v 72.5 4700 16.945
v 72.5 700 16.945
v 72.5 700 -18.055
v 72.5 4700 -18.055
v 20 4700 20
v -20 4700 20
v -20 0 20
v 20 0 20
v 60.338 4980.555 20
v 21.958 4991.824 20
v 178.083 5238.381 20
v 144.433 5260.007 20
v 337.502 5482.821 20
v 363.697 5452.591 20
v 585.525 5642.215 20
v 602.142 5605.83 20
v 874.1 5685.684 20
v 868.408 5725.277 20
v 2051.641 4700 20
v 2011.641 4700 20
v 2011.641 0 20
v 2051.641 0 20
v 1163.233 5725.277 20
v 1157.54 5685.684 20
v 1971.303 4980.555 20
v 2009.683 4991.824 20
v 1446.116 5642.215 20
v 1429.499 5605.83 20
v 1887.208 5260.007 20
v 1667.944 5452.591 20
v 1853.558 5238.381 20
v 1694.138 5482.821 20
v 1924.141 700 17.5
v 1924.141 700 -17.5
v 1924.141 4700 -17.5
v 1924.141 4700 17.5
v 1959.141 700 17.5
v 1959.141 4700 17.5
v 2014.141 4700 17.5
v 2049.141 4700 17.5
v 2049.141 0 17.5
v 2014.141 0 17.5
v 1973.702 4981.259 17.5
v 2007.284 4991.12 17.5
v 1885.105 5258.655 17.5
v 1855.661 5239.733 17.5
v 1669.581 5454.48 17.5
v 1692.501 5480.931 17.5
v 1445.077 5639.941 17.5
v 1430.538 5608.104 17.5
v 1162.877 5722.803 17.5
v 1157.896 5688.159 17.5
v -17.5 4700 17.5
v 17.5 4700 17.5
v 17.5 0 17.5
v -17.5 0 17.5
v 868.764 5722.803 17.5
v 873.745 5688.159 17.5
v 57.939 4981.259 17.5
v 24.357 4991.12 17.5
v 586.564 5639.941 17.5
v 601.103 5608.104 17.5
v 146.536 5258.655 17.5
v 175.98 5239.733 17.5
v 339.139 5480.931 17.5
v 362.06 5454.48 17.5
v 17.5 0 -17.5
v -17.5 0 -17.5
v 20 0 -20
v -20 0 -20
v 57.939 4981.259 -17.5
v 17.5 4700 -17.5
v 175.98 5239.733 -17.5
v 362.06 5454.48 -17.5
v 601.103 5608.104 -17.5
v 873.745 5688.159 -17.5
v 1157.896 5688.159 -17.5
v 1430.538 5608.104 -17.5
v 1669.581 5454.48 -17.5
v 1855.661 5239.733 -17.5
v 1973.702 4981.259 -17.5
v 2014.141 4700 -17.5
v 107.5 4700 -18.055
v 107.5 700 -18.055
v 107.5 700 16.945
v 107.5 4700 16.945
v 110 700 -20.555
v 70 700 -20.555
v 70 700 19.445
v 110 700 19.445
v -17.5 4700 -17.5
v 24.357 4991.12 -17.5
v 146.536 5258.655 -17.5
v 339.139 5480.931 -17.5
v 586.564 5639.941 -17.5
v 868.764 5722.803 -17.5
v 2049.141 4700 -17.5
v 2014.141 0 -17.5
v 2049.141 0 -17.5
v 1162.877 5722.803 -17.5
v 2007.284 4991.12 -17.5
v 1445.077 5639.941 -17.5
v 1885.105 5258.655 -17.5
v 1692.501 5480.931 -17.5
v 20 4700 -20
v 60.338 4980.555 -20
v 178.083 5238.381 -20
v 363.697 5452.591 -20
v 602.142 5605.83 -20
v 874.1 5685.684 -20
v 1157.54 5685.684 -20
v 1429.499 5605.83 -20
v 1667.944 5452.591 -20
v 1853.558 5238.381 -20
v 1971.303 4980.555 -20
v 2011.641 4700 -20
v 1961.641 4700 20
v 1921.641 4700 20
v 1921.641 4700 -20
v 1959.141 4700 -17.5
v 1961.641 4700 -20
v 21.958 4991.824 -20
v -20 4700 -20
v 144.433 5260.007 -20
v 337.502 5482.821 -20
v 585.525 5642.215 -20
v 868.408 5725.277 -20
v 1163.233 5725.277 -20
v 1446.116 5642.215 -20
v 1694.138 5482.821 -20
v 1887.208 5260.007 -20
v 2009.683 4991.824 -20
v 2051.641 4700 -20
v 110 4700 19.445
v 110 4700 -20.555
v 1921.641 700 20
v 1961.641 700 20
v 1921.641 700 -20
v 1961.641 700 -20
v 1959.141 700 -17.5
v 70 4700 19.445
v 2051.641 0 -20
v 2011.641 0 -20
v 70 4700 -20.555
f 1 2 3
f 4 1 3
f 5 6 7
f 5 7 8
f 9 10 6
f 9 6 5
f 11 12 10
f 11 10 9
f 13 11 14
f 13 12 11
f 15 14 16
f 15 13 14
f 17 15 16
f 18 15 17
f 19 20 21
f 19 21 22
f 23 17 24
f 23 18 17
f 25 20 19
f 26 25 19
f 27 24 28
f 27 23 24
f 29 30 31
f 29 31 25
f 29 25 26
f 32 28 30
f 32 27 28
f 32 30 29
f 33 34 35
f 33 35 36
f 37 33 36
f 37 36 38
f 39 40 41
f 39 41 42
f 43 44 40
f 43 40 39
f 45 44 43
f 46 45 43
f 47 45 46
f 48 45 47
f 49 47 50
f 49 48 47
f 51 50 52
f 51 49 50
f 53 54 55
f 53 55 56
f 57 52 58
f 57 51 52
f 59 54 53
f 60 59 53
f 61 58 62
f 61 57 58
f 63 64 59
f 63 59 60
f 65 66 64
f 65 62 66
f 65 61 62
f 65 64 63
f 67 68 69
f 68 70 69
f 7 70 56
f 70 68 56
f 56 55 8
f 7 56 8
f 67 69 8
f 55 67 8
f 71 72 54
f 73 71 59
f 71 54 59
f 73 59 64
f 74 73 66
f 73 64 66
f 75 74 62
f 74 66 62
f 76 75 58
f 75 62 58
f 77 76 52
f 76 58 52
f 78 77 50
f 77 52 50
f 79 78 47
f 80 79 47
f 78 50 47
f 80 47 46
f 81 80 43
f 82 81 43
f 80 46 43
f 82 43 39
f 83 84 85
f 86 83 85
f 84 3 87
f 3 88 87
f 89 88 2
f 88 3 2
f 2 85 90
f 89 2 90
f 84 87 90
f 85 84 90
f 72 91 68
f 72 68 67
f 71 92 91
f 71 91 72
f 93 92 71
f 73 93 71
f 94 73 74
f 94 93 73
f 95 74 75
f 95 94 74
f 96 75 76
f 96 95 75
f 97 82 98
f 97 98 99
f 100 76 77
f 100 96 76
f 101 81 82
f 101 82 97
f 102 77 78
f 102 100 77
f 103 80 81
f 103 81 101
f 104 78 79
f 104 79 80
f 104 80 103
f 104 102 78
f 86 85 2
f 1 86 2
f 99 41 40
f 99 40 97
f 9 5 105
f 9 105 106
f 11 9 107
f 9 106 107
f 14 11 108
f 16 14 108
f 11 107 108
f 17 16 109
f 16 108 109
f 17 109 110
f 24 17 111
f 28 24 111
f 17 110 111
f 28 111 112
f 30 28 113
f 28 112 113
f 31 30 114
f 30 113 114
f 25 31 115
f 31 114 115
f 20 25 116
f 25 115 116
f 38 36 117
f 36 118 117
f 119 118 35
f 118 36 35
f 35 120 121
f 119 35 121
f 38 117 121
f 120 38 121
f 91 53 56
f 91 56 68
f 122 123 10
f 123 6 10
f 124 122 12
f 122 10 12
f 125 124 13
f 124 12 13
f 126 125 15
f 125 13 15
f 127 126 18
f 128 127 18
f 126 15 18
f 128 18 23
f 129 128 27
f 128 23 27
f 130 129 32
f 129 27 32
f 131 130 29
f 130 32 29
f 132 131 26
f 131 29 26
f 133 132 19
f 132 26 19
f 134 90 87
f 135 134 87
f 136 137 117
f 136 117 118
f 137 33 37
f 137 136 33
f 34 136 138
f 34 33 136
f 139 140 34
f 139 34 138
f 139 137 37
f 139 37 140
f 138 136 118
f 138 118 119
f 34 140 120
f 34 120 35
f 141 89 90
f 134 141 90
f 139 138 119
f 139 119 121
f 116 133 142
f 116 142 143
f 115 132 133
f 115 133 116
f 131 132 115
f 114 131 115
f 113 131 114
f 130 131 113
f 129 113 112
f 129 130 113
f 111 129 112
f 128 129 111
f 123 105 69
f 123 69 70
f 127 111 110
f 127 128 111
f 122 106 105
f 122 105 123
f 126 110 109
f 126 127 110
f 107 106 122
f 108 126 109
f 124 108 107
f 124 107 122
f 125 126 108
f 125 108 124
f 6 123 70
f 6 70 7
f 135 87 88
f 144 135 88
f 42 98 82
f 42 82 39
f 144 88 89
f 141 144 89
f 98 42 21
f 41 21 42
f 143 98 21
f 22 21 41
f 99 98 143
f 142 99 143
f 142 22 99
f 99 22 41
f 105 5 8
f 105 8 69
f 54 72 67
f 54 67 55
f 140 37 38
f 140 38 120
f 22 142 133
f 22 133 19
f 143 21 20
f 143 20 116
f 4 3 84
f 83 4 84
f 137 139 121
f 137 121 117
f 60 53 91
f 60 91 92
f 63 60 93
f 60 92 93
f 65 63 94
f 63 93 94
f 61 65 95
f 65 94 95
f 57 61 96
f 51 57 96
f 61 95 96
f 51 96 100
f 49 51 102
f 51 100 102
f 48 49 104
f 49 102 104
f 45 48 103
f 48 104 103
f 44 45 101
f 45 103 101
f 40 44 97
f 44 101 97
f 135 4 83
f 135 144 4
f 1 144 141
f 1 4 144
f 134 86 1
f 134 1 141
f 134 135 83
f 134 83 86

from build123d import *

# Parameters (mm, degrees)
SKETCH1_W    = 40
SKETCH1_H    = 40
SKETCH1_W_2  = 35
SKETCH1_H_2  = 35
SKETCH3_W    = 40
SKETCH3_H    = 40
SKETCH3_W_2  = 35
SKETCH3_H_2  = 35
SKETCH10_W   = 40
SKETCH10_H   = 40
SKETCH10_W_2 = 35
SKETCH10_H_2 = 35


with BuildPart() as part:
    # Sweep1: sweep along a path in Sketch2
    with BuildLine(Plane.XY) as sweep1_path:
        Line((0, 0), (0, 4700))
        ThreePointArc((0, 4700), (1015.820393, 5715.820393), (2031.640786, 4700))
        Line((2031.640786, 4700), (2031.640786, 0))
    # Sketch1 → Sweep1 (sweep)
    with BuildSketch(Plane(origin=(0, 0, 0), x_dir=(1, 0, 0), z_dir=(0, 1, 0))):
        Rectangle(SKETCH1_W, SKETCH1_H)
        Rectangle(SKETCH1_W_2, SKETCH1_H_2, mode=Mode.SUBTRACT)
    sweep(path=sweep1_path.line)


with BuildPart() as body_2:
    # Sweep2: sweep along a path in Sketch4
    with BuildLine(Plane.XY) as sweep2_path:
        Line((90, 4700), (90, 700))
    # Sketch3 → Sweep2 (sweep)
    with BuildSketch(Plane(origin=(0, 4700, 0), x_dir=(1, 0, 0), z_dir=(0, 1, 0))):
        with Locations((90, 0.555104089)):
            Rectangle(SKETCH3_W, SKETCH3_H)
        with Locations((90, 0.555104089)):
            Rectangle(SKETCH3_W_2, SKETCH3_H_2, mode=Mode.SUBTRACT)
    sweep(path=sweep2_path.line)


with BuildPart() as body_3:
    # Sweep4: sweep along a path in Sketch11
    with BuildLine(Plane.XY) as sweep4_path:
        Line((1941.640786, 4700), (1941.640786, 700))
    # Sketch10 → Sweep4 (sweep)
    with BuildSketch(Plane.XZ.offset(-4700)):
        with Locations((1941.640786, 0)):
            Rectangle(SKETCH10_W, SKETCH10_H)
        with Locations((1941.640786, 0)):
            Rectangle(SKETCH10_W_2, SKETCH10_H_2, mode=Mode.SUBTRACT)
    sweep(path=sweep4_path.line)


solid = Compound([part.part, body_2.part, body_3.part])
